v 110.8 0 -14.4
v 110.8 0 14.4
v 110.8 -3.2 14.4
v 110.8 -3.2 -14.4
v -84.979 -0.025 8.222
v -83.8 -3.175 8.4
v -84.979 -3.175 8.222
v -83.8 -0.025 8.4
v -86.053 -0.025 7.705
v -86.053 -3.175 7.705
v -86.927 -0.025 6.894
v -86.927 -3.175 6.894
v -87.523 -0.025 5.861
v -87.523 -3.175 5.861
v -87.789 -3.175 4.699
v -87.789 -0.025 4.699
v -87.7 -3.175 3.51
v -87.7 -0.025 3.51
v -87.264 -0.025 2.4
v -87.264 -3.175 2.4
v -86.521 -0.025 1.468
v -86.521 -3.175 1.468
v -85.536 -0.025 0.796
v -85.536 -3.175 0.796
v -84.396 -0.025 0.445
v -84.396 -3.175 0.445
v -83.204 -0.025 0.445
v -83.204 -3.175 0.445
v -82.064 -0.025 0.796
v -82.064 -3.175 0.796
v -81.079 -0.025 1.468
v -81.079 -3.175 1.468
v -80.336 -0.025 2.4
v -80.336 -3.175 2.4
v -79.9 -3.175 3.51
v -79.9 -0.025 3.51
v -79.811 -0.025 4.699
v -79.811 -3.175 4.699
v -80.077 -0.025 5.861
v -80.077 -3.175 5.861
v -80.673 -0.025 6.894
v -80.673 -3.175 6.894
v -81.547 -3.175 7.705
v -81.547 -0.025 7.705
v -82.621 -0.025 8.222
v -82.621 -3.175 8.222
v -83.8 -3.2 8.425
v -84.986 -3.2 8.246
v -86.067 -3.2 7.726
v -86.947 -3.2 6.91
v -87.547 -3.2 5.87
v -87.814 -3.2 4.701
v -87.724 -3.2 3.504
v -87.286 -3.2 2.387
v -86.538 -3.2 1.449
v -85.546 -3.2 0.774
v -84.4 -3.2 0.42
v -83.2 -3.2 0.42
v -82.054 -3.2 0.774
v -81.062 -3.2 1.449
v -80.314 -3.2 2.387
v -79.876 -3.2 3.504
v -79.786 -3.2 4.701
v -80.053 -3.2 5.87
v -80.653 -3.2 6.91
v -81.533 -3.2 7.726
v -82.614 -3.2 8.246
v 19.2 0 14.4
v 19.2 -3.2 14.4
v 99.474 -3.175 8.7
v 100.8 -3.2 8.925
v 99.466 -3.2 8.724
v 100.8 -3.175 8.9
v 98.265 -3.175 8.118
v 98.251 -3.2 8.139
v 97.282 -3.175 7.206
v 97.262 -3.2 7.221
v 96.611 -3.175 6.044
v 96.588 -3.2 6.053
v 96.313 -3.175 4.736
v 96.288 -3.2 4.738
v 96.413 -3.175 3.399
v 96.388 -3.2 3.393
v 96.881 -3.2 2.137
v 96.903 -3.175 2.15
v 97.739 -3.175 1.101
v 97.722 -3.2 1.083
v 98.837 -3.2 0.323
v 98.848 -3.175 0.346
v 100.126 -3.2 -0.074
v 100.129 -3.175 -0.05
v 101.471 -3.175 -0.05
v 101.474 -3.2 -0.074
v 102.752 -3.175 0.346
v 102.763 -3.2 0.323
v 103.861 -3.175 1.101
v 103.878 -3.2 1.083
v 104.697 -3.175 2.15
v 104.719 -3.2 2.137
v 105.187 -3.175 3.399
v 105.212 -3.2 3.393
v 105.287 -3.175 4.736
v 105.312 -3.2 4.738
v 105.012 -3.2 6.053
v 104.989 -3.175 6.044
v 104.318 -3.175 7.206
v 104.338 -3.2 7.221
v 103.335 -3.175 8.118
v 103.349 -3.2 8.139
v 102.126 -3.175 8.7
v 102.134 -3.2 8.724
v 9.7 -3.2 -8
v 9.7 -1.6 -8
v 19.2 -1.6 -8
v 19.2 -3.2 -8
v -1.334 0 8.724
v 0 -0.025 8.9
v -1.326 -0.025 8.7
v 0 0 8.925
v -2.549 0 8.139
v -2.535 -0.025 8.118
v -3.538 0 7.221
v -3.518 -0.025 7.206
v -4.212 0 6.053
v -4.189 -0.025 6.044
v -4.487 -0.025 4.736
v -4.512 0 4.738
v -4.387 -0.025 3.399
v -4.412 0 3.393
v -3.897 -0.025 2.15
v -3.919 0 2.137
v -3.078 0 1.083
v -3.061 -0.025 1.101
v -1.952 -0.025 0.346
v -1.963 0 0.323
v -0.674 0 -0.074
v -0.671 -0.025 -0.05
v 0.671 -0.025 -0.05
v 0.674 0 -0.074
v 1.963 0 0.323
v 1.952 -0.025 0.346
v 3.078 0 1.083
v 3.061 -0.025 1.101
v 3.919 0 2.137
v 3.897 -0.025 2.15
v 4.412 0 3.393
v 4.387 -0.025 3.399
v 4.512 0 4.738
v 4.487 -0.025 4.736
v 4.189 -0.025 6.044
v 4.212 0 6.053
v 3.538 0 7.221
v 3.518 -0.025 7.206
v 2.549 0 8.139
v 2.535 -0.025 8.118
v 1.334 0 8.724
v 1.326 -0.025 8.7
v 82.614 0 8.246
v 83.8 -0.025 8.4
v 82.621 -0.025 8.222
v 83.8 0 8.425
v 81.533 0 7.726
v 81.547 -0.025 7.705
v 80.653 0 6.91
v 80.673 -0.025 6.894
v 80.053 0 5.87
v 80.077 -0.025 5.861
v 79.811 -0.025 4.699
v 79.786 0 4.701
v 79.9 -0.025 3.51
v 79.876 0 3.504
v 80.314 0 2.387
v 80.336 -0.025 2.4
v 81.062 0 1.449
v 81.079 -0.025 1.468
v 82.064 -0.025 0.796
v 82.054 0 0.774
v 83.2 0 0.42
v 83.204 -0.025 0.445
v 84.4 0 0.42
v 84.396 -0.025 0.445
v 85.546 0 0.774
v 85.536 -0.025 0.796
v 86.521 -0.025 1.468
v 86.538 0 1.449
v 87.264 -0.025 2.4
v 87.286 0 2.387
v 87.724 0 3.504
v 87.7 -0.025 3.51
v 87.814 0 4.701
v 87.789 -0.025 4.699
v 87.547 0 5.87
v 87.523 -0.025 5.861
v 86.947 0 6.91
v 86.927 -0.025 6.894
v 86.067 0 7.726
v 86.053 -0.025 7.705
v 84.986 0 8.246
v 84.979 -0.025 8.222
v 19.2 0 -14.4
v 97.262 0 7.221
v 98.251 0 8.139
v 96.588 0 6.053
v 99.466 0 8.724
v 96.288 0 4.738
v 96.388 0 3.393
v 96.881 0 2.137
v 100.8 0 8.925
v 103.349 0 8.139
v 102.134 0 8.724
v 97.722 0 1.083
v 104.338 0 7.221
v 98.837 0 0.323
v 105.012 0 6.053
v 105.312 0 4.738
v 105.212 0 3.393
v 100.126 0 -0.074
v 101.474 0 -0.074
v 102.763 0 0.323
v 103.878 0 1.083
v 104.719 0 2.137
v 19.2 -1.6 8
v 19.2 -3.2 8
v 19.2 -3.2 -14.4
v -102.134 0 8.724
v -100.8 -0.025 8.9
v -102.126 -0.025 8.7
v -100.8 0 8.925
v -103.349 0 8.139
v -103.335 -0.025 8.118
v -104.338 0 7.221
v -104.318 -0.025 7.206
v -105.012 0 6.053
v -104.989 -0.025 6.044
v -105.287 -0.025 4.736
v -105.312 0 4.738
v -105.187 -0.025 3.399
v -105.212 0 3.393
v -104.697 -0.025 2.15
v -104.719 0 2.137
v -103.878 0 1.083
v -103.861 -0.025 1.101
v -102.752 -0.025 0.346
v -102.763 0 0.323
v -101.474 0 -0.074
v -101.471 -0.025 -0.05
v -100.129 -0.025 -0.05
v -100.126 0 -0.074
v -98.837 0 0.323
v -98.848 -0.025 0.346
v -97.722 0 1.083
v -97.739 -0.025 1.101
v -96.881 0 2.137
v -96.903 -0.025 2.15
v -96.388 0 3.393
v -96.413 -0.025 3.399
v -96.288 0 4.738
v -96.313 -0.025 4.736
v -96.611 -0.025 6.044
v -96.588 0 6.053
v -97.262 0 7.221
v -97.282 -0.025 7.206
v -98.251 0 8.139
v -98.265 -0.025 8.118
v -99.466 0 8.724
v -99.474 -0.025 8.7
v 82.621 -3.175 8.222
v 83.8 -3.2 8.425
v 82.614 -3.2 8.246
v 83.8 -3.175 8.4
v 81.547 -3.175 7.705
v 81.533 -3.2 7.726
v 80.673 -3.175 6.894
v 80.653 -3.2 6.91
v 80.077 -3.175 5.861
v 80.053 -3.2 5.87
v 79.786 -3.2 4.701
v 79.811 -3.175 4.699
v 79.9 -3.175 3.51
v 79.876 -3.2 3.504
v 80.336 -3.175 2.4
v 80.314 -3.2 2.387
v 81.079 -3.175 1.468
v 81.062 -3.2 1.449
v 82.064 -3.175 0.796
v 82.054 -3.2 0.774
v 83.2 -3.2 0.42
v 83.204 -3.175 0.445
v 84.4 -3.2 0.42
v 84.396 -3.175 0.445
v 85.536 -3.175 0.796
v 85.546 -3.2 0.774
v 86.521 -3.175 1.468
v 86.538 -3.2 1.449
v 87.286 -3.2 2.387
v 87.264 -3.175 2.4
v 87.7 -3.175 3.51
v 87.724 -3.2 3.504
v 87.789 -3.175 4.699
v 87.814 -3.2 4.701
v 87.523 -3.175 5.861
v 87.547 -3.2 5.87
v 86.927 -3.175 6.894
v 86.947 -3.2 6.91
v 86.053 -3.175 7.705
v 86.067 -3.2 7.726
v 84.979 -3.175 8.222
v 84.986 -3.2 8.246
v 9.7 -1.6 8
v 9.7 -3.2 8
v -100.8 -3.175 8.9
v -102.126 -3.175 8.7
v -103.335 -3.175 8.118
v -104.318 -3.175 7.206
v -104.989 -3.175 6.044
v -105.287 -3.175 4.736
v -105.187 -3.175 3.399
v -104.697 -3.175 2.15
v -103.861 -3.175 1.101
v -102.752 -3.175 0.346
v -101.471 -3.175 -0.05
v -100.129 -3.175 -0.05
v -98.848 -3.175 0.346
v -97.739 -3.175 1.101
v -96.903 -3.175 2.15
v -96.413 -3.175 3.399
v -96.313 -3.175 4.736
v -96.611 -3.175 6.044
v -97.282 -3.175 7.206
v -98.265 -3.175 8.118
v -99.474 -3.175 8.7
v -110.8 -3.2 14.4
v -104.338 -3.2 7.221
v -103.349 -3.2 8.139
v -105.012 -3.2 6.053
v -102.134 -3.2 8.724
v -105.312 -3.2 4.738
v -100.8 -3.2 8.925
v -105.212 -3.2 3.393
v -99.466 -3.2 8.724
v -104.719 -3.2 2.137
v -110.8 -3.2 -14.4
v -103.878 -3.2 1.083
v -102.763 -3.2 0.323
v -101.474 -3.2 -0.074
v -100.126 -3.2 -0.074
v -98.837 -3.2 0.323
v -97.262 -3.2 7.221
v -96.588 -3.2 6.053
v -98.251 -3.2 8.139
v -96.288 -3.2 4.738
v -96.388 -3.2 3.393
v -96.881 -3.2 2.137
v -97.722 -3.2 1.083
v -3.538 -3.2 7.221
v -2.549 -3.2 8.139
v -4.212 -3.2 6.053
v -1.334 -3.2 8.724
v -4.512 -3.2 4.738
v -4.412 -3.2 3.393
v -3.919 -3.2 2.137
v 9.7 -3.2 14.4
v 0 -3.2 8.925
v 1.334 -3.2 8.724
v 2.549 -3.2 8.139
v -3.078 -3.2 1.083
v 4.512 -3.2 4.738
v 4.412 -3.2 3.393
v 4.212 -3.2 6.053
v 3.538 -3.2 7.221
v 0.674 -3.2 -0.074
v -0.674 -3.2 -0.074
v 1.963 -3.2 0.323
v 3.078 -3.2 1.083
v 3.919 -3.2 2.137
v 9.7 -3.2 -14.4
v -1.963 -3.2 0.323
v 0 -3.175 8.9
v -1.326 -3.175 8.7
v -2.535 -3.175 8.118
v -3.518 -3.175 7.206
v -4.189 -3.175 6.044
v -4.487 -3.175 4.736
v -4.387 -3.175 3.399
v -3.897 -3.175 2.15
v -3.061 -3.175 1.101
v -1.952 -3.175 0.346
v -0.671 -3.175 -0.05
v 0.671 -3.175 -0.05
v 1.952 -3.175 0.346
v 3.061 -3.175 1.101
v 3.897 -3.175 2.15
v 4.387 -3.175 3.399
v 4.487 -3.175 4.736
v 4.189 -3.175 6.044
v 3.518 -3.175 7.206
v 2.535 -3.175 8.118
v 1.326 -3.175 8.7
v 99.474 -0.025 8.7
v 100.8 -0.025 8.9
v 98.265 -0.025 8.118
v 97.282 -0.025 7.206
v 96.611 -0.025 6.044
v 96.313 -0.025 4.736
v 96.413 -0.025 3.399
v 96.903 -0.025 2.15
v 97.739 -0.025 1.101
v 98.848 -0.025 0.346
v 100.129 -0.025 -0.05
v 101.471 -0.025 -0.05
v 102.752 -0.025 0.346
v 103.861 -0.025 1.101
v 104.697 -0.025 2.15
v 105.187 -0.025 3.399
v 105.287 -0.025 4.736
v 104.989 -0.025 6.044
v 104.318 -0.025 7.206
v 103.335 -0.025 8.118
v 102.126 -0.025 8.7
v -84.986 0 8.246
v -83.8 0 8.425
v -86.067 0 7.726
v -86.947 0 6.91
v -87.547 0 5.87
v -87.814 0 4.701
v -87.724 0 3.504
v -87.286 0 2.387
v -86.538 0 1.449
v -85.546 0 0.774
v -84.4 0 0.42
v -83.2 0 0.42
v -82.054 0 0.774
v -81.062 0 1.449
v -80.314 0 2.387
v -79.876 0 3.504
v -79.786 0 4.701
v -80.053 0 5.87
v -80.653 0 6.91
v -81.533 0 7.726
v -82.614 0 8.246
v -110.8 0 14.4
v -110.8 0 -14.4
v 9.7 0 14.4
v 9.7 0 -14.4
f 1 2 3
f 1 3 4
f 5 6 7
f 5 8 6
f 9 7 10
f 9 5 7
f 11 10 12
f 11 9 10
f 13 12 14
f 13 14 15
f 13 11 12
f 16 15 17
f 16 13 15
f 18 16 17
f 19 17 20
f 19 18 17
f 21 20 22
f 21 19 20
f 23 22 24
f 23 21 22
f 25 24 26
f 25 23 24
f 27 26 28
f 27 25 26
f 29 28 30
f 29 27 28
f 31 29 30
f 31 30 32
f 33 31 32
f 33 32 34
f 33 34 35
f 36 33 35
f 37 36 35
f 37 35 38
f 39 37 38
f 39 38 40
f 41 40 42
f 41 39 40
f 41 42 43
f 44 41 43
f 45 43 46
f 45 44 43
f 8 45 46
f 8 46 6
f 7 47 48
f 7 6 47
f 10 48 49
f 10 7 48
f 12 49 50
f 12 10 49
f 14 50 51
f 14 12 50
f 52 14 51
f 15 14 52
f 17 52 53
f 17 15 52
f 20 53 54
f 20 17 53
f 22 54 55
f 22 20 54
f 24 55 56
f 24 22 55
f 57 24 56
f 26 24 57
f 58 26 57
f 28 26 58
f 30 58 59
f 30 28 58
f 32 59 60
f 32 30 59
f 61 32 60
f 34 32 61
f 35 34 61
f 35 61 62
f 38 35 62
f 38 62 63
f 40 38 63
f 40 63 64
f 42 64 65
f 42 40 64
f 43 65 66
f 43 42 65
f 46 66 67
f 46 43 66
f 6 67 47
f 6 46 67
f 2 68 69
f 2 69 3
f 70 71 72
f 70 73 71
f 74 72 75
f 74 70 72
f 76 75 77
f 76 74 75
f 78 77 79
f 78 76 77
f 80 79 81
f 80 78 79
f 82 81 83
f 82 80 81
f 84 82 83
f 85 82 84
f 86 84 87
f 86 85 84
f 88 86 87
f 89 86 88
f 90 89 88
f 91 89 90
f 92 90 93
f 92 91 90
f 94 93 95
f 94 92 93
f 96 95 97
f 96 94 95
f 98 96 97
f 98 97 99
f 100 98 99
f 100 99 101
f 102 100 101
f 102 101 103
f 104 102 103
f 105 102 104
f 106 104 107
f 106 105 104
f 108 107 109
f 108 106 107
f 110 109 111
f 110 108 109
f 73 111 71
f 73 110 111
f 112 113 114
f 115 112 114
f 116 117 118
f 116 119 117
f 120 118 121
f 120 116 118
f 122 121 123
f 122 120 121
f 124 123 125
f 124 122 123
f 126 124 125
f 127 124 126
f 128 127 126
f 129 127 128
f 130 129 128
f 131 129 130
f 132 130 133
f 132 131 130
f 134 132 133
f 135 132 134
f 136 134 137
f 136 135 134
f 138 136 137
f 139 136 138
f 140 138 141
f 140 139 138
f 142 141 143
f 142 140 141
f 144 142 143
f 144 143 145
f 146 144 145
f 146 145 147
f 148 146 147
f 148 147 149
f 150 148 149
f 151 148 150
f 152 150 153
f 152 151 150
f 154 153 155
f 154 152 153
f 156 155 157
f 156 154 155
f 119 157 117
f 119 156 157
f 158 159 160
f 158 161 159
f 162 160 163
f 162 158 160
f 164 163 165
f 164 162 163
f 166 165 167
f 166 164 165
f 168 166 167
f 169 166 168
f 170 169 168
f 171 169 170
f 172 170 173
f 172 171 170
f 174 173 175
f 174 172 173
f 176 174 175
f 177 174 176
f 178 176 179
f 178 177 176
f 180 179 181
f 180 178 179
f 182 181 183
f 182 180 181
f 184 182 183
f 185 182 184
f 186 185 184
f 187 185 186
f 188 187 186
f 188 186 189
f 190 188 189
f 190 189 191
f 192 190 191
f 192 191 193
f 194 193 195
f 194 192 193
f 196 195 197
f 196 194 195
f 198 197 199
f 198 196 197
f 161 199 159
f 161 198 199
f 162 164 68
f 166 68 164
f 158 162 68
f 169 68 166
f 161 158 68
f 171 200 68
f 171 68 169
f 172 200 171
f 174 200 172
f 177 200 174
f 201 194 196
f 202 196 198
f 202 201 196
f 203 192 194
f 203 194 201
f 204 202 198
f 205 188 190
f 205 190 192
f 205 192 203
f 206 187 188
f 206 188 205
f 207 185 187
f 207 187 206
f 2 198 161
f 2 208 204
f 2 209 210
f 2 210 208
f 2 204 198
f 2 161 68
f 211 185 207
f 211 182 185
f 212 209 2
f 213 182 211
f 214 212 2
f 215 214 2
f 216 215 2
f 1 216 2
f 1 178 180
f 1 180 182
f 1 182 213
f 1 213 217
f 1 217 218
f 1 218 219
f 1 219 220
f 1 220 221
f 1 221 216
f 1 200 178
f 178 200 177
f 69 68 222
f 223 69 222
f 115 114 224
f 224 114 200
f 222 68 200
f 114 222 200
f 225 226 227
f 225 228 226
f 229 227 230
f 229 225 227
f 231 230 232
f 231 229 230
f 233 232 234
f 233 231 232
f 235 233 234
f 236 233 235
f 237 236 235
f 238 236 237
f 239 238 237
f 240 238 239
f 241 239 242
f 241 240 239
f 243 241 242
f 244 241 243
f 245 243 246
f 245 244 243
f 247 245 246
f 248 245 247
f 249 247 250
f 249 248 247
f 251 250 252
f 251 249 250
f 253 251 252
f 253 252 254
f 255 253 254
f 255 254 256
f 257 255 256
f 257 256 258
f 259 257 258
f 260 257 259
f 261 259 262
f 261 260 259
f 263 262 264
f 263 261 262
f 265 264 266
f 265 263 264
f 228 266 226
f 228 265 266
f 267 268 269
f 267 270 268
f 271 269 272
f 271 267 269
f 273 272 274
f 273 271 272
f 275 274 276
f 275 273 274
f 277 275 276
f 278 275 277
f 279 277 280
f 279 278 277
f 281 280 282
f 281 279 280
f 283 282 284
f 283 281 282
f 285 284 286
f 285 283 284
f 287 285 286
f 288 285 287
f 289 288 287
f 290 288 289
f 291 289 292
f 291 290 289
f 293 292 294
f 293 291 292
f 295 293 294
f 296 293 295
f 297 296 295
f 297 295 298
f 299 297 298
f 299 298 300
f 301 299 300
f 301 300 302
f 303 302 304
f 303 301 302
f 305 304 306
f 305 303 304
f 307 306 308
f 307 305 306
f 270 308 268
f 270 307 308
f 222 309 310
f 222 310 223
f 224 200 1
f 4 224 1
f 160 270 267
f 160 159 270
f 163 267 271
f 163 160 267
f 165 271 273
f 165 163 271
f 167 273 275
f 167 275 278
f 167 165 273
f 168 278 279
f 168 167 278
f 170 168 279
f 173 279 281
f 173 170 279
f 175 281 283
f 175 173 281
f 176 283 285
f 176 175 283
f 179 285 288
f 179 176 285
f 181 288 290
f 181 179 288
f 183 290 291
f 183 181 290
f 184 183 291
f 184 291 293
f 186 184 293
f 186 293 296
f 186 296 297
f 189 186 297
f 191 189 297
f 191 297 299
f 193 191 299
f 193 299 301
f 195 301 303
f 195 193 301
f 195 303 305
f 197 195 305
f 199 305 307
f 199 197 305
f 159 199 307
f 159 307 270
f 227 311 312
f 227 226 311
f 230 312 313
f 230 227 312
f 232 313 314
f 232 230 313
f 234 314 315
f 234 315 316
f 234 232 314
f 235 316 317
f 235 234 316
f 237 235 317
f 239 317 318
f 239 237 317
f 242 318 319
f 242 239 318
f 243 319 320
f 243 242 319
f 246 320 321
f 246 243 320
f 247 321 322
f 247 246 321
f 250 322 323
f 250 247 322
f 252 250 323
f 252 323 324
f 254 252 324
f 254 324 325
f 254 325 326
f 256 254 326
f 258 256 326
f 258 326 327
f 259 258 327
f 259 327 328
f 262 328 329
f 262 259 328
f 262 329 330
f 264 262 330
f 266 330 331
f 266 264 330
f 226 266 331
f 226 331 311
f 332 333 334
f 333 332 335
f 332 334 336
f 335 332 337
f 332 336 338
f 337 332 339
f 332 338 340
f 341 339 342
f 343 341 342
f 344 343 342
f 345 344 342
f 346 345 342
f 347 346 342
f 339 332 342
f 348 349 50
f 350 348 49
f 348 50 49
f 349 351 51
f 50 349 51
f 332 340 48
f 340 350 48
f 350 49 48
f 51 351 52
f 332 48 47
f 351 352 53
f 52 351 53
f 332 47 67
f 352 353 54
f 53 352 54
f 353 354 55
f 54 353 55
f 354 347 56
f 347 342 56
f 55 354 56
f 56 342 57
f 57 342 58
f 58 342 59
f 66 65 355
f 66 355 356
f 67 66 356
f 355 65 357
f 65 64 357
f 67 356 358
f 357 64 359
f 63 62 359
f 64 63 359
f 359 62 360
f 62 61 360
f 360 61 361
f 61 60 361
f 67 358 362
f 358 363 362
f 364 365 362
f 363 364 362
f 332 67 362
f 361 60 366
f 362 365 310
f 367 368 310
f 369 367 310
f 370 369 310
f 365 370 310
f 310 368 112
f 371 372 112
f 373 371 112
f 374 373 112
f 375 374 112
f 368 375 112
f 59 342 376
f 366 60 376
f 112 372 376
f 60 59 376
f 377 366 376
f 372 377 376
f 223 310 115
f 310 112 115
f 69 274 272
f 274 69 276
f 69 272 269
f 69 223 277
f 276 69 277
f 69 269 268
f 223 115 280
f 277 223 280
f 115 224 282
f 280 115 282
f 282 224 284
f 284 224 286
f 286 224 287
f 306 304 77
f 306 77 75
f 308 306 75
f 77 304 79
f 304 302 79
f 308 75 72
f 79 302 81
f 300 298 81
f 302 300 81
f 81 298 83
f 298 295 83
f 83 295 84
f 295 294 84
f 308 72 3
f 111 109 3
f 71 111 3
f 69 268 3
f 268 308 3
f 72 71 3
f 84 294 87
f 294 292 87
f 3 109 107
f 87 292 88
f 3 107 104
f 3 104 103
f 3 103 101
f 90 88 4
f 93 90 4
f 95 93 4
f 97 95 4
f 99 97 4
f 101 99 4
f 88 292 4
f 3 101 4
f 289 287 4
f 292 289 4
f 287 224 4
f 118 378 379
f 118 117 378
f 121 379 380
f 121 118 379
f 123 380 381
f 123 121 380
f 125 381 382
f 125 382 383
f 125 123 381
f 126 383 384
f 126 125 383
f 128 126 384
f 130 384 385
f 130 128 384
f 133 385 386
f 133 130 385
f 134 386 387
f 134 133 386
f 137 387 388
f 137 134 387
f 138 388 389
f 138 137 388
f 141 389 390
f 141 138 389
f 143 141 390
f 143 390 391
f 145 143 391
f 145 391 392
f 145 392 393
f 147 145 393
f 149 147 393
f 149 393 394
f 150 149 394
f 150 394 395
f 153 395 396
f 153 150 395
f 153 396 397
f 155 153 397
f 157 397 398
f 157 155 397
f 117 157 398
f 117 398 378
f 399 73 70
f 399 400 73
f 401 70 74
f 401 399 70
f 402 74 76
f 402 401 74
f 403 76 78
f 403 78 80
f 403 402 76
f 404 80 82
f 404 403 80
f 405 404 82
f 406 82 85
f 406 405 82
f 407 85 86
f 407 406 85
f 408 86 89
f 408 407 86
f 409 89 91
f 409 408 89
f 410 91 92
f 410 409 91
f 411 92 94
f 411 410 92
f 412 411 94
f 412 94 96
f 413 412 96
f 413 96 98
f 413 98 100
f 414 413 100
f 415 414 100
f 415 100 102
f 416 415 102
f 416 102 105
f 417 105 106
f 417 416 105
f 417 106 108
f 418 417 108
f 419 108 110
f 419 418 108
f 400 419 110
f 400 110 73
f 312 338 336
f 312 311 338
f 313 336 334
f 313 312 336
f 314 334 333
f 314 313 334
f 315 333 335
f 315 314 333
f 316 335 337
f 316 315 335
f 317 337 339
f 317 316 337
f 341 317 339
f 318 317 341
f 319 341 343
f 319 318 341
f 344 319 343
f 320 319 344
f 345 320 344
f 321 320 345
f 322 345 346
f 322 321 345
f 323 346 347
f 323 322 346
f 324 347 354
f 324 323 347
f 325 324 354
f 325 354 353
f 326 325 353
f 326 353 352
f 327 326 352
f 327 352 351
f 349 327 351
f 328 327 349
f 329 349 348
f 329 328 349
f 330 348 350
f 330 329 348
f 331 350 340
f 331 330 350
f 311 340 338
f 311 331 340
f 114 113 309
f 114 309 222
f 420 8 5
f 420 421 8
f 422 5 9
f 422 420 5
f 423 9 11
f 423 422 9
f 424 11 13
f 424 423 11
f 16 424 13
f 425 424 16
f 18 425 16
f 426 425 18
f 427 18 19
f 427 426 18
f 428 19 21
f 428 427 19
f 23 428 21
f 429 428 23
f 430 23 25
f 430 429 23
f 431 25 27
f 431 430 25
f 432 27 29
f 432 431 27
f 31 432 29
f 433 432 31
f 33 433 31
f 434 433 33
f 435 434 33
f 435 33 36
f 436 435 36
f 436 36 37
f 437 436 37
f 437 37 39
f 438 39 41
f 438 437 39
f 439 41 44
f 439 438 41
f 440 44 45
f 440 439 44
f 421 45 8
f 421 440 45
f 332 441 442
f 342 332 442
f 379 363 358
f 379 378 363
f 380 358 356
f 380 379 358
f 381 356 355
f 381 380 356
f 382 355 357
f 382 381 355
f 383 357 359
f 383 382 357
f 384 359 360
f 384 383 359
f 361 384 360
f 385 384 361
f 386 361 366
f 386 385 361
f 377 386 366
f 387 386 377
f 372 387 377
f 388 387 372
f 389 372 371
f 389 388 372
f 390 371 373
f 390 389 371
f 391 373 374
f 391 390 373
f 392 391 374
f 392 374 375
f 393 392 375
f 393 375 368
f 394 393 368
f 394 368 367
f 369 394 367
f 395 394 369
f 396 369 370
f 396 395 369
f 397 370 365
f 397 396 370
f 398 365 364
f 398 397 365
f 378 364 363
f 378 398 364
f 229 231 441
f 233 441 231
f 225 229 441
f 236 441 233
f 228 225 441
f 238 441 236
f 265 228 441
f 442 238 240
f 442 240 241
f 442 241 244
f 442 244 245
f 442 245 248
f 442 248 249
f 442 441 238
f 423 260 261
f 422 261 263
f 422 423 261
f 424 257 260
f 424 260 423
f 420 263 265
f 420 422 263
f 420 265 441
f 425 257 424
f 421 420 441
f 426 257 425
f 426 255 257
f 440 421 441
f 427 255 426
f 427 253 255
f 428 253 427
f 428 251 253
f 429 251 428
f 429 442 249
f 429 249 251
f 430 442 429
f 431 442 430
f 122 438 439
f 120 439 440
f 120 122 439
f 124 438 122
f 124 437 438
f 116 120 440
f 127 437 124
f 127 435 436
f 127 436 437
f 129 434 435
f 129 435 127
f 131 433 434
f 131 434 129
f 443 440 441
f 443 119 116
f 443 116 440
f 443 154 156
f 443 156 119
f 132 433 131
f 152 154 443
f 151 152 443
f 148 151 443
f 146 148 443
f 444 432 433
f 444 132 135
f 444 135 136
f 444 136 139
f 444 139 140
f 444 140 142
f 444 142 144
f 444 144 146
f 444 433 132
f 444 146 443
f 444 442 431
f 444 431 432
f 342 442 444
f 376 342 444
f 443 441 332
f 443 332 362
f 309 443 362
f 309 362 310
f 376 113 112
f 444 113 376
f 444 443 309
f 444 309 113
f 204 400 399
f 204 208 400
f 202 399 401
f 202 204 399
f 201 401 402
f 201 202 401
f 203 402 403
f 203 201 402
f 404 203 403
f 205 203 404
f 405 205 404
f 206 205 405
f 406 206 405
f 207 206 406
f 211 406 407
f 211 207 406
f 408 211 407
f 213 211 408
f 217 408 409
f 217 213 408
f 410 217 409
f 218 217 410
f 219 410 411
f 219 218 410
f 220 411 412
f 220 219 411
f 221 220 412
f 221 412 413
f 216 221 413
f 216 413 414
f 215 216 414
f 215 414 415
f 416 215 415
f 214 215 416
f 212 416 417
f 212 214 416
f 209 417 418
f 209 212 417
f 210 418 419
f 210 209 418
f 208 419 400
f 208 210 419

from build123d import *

# Parameters (mm, degrees)
SKETCH1_W                      = 221.6
SKETCH1_H                      = 28.8
BOSS_EXTRUDE1_DEPTH            = 3.2
CUT_EXTRUDE1_REACH             = 113.778
SKETCH2_W                      = 9.5
SKETCH2_H                      = 6.4
CUT_EXTRUDE2_REACH             = 115.087
SKETCH3_W                      = 9.5
SKETCH3_H                      = 1.6
M8_CLEARANCE_HOLE1_AT_2_COUNT  = 2
M8_CLEARANCE_HOLE1_AT_2_PITCH  = 201.6
M8_CLEARANCE_HOLE1_AT_3_COUNT  = 2
M8_CLEARANCE_HOLE1_AT_3_PITCH  = 100.8
F_8_0MM_DOWEL_HOLE1_AT_2_COUNT = 2
F_8_0MM_DOWEL_HOLE1_AT_2_PITCH = 167.6


with BuildPart() as part:
    # Sketch1 → Boss-Extrude1 (new body)
    with BuildSketch(Plane(origin=(0, 0, 0), x_dir=(1, 0, 0), z_dir=(0, 1, 0))):
        Rectangle(SKETCH1_W, SKETCH1_H)
    extrude(amount=-BOSS_EXTRUDE1_DEPTH)

    # Sketch2 → Cut-Extrude1 (cut, up to next)
    with BuildSketch(Plane(origin=(0, 0, 0), x_dir=(1, 0, 0), z_dir=(0, 1, 0)), mode=Mode.PRIVATE) as cut_extrude1_sk1:
        with Locations((14.45, 11.2)):
            Rectangle(SKETCH2_W, SKETCH2_H)
    cut_extrude1_tool1 = extrude(cut_extrude1_sk1.sketch, amount=-CUT_EXTRUDE1_REACH, mode=Mode.PRIVATE) & part.part
    # Sketch2 → Cut-Extrude1 (cut, up to next)
    with BuildSketch(Plane(origin=(0, 0, 0), x_dir=(1, 0, 0), z_dir=(0, 1, 0)), mode=Mode.PRIVATE) as cut_extrude1_sk2:
        with Locations((14.45, -11.2)):
            Rectangle(SKETCH2_W, SKETCH2_H)
    cut_extrude1_tool2 = extrude(cut_extrude1_sk2.sketch, amount=-CUT_EXTRUDE1_REACH, mode=Mode.PRIVATE) & part.part
    add(cut_extrude1_tool1.solids().sort_by_distance((14.45, 0, -11.2))[0], mode=Mode.SUBTRACT)
    add(cut_extrude1_tool2.solids().sort_by_distance((14.45, 0, 11.2))[0], mode=Mode.SUBTRACT)

    # Sketch3 → Cut-Extrude2 (cut, up to next)
    with BuildSketch(Plane.XY.offset(8), mode=Mode.PRIVATE) as cut_extrude2_sk1:
        with Locations((14.45, -0.8)):
            Rectangle(SKETCH3_W, SKETCH3_H)
    cut_extrude2_tool1 = extrude(cut_extrude2_sk1.sketch, amount=-CUT_EXTRUDE2_REACH, mode=Mode.PRIVATE) & part.part
    add(cut_extrude2_tool1.solids().sort_by_distance((14.45, -0.8, 8))[0], mode=Mode.SUBTRACT)

    # Sketch5 → M8 Clearance Hole1 (revolve, cut)
    with BuildSketch(Plane(origin=(-100.8, 0, 4.4), x_dir=(0, 0, 1), z_dir=(1, 0, 0))):
        Polygon((0, 0), (0, 3.2), (4.525, 3.2), (4.5, 3.175), (4.5, 0.025), (4.525, 0), align=None)
    m8_clearance_hole1 = revolve(axis=Axis((-100.8, 6.35, 4.4), (0, -1, 0)), mode=Mode.SUBTRACT)

    # M8 Clearance Hole1 at 2: M8 Clearance Hole1 ×2
    with Locations(*[(i * M8_CLEARANCE_HOLE1_AT_2_PITCH, 0, 0) for i in range(1, M8_CLEARANCE_HOLE1_AT_2_COUNT)]):
        add(m8_clearance_hole1, mode=Mode.SUBTRACT)

    # M8 Clearance Hole1 at 3: M8 Clearance Hole1 ×2
    with Locations(*[(i * M8_CLEARANCE_HOLE1_AT_3_PITCH, 0, 0) for i in range(1, M8_CLEARANCE_HOLE1_AT_3_COUNT)]):
        add(m8_clearance_hole1, mode=Mode.SUBTRACT)

    # Sketch7 → Ø8.0mm Dowel Hole1 (revolve, cut)
    with BuildSketch(Plane(origin=(83.8, 0, 4.4), x_dir=(0, 0, 1), z_dir=(1, 0, 0))):
        Polygon((0, 0), (0, 3.2), (4.025, 3.2), (4, 3.175), (4, 0.025), (4.025, 0), align=None)
    f_8_0mm_dowel_hole1 = revolve(axis=Axis((83.8, 6.35, 4.4), (0, -1, 0)), mode=Mode.SUBTRACT)

    # Ø8.0mm Dowel Hole1 at 2: Ø8.0mm Dowel Hole1 ×2
    with Locations(*[(-i * F_8_0MM_DOWEL_HOLE1_AT_2_PITCH, 0, 0) for i in range(1, F_8_0MM_DOWEL_HOLE1_AT_2_COUNT)]):
        add(f_8_0mm_dowel_hole1, mode=Mode.SUBTRACT)


solid = part.part
